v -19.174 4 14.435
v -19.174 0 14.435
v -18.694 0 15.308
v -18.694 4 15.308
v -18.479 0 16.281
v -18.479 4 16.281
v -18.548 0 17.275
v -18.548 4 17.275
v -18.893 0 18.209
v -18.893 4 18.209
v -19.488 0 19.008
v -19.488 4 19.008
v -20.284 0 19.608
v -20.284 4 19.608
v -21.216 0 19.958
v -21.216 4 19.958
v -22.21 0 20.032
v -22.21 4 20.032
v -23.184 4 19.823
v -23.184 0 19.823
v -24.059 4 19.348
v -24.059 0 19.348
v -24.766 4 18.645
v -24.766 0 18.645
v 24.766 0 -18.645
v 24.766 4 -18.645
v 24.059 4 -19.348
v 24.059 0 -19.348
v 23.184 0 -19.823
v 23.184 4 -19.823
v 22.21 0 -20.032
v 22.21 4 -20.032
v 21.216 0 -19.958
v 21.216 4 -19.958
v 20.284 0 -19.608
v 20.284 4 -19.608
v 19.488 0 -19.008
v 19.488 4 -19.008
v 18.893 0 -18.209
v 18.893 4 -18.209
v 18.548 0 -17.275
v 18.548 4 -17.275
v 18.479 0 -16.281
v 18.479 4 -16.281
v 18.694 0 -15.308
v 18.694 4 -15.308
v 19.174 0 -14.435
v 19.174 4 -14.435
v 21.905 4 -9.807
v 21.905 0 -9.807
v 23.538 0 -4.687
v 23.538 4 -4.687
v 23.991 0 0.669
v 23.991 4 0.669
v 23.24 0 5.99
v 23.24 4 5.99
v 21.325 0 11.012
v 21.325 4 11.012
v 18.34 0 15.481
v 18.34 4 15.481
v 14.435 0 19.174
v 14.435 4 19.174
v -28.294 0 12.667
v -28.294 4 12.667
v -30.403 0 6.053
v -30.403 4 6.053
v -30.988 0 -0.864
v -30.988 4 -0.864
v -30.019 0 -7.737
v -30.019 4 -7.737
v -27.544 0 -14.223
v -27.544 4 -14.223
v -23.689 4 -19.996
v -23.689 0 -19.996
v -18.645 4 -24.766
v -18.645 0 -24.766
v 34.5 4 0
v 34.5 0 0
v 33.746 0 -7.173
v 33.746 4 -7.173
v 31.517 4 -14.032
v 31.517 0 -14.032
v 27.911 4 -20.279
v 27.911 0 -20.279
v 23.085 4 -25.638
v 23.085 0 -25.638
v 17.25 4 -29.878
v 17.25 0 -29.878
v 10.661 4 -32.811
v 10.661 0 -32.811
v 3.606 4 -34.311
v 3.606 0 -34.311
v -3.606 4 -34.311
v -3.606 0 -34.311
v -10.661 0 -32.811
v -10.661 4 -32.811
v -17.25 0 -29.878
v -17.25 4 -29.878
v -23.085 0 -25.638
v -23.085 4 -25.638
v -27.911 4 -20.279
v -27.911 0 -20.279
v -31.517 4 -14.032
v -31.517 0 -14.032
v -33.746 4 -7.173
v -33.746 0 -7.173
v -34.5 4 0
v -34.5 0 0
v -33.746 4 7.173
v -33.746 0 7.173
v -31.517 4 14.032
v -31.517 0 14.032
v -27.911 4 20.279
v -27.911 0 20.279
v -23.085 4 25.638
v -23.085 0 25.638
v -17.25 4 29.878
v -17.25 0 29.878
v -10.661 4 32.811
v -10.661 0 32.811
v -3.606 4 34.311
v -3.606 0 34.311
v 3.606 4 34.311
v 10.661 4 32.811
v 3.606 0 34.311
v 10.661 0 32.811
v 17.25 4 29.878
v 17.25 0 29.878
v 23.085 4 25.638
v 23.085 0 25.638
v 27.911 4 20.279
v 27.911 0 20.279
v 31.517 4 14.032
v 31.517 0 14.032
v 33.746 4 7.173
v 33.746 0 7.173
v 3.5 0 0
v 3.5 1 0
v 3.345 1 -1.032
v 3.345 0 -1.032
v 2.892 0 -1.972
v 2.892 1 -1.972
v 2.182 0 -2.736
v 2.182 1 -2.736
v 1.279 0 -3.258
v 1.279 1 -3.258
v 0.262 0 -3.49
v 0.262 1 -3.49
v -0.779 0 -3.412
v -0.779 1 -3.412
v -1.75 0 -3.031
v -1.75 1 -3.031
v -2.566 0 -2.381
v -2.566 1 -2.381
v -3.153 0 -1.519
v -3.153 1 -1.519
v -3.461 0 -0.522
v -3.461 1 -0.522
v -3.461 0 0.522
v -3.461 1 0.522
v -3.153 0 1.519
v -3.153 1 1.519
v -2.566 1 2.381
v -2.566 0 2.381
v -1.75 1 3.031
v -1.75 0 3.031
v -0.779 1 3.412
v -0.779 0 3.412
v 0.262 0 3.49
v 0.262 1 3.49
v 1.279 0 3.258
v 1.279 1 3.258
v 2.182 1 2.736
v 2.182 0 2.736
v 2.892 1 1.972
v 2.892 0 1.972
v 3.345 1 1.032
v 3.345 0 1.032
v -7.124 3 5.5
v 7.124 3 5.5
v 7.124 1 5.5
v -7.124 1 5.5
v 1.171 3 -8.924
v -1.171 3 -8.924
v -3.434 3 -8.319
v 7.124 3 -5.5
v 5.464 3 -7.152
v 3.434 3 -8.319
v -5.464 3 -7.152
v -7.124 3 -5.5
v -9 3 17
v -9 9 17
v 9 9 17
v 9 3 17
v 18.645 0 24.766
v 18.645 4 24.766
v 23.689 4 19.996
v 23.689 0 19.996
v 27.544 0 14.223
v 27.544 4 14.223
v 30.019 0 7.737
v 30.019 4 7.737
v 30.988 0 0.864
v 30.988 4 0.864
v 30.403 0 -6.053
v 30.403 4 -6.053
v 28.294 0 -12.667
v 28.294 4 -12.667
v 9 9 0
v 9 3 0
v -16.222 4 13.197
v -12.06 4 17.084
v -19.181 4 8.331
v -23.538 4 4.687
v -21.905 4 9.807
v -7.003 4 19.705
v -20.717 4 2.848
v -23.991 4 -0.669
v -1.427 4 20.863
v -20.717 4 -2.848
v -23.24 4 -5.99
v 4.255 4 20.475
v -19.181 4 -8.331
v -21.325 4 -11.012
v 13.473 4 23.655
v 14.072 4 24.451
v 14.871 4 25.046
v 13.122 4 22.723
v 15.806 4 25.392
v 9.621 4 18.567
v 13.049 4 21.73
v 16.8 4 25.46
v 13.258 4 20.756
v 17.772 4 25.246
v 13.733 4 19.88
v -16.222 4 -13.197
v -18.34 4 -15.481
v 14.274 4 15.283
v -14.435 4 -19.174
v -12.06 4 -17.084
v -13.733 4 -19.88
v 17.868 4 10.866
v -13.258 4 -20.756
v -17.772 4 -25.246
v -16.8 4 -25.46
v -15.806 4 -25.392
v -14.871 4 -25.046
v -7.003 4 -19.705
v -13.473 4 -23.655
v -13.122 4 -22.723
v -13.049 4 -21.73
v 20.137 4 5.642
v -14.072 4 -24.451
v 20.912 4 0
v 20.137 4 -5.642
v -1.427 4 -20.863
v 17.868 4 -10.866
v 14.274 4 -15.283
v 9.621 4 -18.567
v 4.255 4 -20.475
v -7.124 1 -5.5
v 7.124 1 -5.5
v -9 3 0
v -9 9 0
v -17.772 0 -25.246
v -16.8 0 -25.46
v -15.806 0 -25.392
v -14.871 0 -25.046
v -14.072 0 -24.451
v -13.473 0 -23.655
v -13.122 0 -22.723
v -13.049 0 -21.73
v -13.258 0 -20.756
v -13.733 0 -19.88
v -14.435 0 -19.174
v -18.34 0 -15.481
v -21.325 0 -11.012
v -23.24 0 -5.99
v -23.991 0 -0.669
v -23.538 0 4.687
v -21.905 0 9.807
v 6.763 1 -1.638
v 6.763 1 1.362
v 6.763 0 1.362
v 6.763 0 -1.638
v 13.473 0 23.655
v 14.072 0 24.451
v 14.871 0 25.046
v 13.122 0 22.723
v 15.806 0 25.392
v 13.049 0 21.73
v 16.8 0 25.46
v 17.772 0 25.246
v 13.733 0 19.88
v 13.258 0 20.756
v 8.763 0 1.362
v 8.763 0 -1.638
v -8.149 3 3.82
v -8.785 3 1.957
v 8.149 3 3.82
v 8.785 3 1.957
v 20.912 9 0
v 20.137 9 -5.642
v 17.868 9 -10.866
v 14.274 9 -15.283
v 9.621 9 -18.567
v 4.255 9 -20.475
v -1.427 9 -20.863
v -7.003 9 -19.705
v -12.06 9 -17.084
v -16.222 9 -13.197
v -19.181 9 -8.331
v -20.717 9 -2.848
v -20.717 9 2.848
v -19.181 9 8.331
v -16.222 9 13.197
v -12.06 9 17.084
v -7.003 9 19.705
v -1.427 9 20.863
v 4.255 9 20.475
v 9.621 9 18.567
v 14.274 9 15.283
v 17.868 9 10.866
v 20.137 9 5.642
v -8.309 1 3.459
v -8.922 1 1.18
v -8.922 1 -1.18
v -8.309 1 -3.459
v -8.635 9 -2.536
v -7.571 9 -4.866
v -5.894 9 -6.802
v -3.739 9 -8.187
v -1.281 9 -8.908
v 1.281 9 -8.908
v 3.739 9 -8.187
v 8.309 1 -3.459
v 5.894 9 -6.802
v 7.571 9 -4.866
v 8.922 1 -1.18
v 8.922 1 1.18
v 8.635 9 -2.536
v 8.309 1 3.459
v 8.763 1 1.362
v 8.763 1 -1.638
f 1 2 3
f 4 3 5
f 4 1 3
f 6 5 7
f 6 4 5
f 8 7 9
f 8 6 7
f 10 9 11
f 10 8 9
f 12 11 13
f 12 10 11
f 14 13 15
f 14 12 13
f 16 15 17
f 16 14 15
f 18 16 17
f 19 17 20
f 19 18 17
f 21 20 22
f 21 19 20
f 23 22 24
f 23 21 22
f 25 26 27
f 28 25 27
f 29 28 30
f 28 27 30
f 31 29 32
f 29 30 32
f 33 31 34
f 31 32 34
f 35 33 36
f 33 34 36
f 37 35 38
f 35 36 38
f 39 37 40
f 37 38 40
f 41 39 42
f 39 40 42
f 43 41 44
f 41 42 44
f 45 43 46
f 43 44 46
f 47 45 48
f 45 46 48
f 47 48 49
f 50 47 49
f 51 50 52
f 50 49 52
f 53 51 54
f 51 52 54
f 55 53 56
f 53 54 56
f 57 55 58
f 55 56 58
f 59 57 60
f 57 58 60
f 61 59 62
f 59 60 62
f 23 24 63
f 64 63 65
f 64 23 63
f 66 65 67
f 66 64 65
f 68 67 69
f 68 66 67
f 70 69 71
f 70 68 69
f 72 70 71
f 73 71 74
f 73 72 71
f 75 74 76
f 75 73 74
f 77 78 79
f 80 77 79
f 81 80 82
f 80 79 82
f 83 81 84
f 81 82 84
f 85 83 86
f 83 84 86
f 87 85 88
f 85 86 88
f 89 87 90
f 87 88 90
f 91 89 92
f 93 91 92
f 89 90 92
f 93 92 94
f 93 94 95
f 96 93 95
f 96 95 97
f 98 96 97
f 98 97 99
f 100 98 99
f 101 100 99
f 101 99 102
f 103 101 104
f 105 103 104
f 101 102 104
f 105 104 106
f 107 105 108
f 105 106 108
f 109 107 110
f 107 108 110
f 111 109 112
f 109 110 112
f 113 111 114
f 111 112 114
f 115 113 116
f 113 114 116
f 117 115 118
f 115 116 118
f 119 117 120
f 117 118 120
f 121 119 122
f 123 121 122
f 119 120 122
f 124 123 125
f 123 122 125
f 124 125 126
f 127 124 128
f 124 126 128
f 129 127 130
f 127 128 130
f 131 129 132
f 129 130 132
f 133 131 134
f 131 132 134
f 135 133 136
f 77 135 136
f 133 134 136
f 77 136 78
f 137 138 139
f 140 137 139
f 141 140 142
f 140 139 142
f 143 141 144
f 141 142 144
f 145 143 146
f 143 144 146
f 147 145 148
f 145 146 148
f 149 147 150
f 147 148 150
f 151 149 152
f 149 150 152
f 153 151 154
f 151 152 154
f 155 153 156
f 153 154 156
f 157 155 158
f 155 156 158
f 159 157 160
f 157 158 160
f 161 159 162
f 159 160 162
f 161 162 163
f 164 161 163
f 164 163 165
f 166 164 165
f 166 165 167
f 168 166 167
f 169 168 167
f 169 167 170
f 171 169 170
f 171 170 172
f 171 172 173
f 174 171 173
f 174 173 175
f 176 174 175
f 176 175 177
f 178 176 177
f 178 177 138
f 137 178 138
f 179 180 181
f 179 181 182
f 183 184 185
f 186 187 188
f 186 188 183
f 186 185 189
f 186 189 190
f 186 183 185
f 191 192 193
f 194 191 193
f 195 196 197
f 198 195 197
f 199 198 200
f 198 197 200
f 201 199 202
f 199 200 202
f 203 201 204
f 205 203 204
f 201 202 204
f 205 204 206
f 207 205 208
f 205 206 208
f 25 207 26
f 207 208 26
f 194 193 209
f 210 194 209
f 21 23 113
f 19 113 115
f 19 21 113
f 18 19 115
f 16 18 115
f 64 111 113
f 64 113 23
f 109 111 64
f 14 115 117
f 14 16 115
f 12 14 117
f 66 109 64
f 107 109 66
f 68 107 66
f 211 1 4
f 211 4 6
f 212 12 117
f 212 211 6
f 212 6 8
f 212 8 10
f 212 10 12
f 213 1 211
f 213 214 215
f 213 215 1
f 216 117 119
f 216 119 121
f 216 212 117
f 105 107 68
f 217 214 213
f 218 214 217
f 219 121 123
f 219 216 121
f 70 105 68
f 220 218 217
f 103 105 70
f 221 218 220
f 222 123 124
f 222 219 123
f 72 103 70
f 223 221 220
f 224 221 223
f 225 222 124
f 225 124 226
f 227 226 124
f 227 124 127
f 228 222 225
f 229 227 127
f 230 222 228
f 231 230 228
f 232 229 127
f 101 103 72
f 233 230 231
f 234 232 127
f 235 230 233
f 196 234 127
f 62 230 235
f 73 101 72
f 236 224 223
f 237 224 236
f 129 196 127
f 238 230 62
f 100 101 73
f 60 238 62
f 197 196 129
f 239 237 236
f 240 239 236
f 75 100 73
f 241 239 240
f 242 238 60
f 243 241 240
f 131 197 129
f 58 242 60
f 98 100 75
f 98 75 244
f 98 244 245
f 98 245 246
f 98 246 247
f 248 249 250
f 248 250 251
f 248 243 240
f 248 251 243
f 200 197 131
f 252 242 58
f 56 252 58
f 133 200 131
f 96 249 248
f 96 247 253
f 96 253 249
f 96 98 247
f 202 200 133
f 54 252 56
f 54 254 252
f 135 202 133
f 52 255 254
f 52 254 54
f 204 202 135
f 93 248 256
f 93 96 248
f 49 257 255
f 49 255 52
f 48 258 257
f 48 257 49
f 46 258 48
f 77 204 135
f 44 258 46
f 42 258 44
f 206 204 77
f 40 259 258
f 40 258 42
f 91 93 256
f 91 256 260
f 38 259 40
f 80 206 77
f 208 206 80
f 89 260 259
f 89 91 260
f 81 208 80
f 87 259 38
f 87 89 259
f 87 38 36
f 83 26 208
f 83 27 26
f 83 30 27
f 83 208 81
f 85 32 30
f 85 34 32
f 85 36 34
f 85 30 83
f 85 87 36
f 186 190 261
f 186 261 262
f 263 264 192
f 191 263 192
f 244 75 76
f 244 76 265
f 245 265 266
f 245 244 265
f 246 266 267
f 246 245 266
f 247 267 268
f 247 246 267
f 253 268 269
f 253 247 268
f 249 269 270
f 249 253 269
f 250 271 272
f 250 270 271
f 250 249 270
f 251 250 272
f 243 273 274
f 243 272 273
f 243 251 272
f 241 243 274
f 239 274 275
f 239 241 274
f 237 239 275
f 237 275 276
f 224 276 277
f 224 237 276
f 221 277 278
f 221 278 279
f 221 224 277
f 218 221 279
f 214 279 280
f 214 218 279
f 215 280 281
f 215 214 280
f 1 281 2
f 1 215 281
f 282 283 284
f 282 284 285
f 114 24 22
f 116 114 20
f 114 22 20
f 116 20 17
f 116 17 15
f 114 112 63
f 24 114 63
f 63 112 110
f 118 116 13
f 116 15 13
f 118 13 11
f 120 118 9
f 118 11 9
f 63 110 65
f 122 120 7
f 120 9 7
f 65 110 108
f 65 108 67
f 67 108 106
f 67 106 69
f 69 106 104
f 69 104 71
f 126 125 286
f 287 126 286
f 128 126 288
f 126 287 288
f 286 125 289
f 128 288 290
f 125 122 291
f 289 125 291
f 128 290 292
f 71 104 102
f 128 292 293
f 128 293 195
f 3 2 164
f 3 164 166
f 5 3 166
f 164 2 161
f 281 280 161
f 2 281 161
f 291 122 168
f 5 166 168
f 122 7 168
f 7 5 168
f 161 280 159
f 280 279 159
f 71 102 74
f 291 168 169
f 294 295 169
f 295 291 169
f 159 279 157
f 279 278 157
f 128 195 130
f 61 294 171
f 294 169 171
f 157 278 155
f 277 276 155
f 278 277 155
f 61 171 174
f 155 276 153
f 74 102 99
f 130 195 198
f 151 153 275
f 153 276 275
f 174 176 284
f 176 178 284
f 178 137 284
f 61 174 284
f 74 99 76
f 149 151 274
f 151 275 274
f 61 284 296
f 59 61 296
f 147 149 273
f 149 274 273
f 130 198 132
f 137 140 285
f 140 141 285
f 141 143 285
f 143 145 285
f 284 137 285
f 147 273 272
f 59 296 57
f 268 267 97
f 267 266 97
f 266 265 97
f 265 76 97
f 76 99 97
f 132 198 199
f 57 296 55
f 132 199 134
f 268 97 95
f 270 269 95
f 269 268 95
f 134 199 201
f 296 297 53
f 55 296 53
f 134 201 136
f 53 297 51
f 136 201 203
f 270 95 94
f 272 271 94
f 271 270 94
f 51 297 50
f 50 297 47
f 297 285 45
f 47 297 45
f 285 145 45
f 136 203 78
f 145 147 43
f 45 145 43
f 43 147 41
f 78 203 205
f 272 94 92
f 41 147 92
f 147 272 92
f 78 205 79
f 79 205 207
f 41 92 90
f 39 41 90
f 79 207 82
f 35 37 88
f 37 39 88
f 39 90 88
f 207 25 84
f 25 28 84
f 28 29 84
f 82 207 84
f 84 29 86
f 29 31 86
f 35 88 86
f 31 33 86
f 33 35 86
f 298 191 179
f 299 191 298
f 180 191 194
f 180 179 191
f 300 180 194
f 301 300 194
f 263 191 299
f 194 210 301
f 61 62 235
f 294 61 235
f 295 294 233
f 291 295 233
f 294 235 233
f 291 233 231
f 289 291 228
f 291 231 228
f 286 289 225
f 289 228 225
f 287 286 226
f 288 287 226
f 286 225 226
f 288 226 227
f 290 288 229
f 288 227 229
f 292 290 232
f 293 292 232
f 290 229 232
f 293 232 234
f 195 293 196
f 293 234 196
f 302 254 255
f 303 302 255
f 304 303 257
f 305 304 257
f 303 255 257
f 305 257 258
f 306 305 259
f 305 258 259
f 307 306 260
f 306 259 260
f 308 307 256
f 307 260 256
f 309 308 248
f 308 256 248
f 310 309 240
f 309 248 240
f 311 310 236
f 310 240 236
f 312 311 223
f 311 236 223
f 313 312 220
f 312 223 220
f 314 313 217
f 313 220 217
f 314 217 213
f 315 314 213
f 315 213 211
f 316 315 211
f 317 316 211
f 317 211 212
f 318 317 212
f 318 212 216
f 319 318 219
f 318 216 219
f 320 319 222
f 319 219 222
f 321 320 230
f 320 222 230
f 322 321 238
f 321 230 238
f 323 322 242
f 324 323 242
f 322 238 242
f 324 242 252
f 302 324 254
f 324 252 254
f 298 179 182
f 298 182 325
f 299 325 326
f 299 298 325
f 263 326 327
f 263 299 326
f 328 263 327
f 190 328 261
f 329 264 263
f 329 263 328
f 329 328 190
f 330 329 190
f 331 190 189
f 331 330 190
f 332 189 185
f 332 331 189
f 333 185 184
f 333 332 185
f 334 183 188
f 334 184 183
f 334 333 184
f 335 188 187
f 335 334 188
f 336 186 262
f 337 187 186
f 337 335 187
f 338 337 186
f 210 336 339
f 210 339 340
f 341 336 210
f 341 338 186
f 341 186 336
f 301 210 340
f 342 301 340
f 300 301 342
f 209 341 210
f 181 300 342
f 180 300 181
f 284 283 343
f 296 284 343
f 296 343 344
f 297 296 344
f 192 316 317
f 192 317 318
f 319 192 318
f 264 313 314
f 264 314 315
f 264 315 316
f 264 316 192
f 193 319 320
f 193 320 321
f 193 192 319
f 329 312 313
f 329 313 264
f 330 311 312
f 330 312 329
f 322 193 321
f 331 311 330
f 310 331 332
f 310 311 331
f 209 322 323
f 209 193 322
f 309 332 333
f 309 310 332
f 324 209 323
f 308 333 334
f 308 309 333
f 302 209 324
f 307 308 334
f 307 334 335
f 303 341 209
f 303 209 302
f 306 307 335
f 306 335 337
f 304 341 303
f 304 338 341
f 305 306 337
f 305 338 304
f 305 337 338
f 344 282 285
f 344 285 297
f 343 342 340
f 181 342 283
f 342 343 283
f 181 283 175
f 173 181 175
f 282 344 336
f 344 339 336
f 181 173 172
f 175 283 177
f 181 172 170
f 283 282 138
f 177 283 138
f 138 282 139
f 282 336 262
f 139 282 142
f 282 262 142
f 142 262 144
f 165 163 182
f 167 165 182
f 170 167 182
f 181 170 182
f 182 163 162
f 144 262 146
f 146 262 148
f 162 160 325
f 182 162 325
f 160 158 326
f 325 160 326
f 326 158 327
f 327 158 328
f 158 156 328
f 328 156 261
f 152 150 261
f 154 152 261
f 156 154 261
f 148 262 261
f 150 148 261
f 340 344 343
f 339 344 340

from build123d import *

# Parameters (mm, degrees)
SKETCH1_R               = 34.5
BOSS_EXTRUDE1_DEPTH     = 4
CUT_EXTRUDE1_DEPTH      = 1
CUT_EXTRUDE1_DEPTH_BACK = 5
SKETCH6_R               = 20.912013364
BOSS_EXTRUDE2_DEPTH     = 5
CUT_EXTRUDE3_DEPTH      = 6
SKETCH7_R               = 3.5
CUT_EXTRUDE4_DEPTH      = 1
CUT_EXTRUDE4_DEPTH_BACK = 10
CUT_EXTRUDE5_DEPTH      = 2
SKETCH9_W               = 2
SKETCH9_H               = 3
CUT_EXTRUDE6_DEPTH      = 10


with BuildPart() as part:
    # Sketch1 → Boss-Extrude1 (new body)
    with BuildSketch(Plane(origin=(0, 0, 0), x_dir=(1, 0, 0), z_dir=(0, 1, 0))):
        Circle(SKETCH1_R)
    extrude(amount=BOSS_EXTRUDE1_DEPTH)

    # Sketch2 → Cut-Extrude1 (cut, two sides)
    with BuildSketch(Plane(origin=(0, 4, 0), x_dir=(1, 0, 0), z_dir=(0, 1, 0))) as cut_extrude1_sk:
        with BuildLine():
            ThreePointArc((18.645465696, -24.765835519), (30.69642547, -4.327755005), (24.765835519, 18.645465696))
            ThreePointArc((24.765835519, 18.645465696), (19.864559575, 19.336475193), (19.173550079, 14.435199249))
            ThreePointArc((19.173550079, 14.435199249), (23.764974557, -3.350520004), (14.435199249, -19.173550079))
            ThreePointArc((14.435199249, -19.173550079), (13.744189753, -24.074826023), (18.645465696, -24.765835519))
        make_face()
        with BuildLine():
            ThreePointArc((-14.435199249, 19.173550079), (-23.764974557, 3.350520004), (-19.173550079, -14.435199249))
            ThreePointArc((-19.173550079, -14.435199249), (-19.864559575, -19.336475193), (-24.765835519, -18.645465696))
            ThreePointArc((-24.765835519, -18.645465696), (-30.69642547, 4.327755005), (-18.645465696, 24.765835519))
            ThreePointArc((-18.645465696, 24.765835519), (-13.744189753, 24.074826023), (-14.435199249, 19.173550079))
        make_face()
    extrude(amount=CUT_EXTRUDE1_DEPTH, mode=Mode.SUBTRACT)
    extrude(cut_extrude1_sk.sketch, amount=-CUT_EXTRUDE1_DEPTH_BACK, mode=Mode.SUBTRACT)

    # Sketch6 → Boss-Extrude2 (add)
    with BuildSketch(Plane(origin=(0, 4, 0), x_dir=(1, 0, 0), z_dir=(0, 1, 0))):
        Circle(SKETCH6_R)
    extrude(amount=BOSS_EXTRUDE2_DEPTH)

    # Sketch5 → Cut-Extrude3 (cut)
    with BuildSketch(Plane(origin=(0, 9, 0), x_dir=(1, 0, 0), z_dir=(0, 1, 0))):
        with BuildLine():
            Line((-9, 0), (-9, -17))
            Line((-9, -17), (9, -17))
            Line((9, -17), (9, 0))
            ThreePointArc((9, 0), (0, 9), (-9, 0))
        make_face()
    extrude(amount=-CUT_EXTRUDE3_DEPTH, mode=Mode.SUBTRACT)

    # Sketch7 → Cut-Extrude4 (cut, two sides)
    with BuildSketch(Plane(origin=(0, 9, 0), x_dir=(1, 0, 0), z_dir=(0, 1, 0))) as cut_extrude4_sk:
        Circle(SKETCH7_R)
    extrude(amount=CUT_EXTRUDE4_DEPTH, mode=Mode.SUBTRACT)
    extrude(cut_extrude4_sk.sketch, amount=-CUT_EXTRUDE4_DEPTH_BACK, mode=Mode.SUBTRACT)

    # Sketch8 → Cut-Extrude5 (cut)
    with BuildSketch(Plane(origin=(0, 3, 0), x_dir=(1, 0, 0), z_dir=(0, 1, 0))):
        with BuildLine():
            Line((7.123903424, -5.5), (-7.123903424, -5.5))
            ThreePointArc((-7.123903424, -5.5), (-9, 0), (-7.123903424, 5.5))
            Line((-7.123903424, 5.5), (7.123903424, 5.5))
            ThreePointArc((7.123903424, 5.5), (9, 0), (7.123903424, -5.5))
        make_face()
    extrude(amount=-CUT_EXTRUDE5_DEPTH, mode=Mode.SUBTRACT)

    # Sketch9 → Cut-Extrude6 (cut, through all)
    with BuildSketch(Plane(origin=(0, 9, 0), x_dir=(1, 0, 0), z_dir=(0, 1, 0))):
        with Locations((7.763148871, 0.138067302)):
            Rectangle(SKETCH9_W, SKETCH9_H)
    extrude(amount=-CUT_EXTRUDE6_DEPTH, mode=Mode.SUBTRACT)


solid = part.part
